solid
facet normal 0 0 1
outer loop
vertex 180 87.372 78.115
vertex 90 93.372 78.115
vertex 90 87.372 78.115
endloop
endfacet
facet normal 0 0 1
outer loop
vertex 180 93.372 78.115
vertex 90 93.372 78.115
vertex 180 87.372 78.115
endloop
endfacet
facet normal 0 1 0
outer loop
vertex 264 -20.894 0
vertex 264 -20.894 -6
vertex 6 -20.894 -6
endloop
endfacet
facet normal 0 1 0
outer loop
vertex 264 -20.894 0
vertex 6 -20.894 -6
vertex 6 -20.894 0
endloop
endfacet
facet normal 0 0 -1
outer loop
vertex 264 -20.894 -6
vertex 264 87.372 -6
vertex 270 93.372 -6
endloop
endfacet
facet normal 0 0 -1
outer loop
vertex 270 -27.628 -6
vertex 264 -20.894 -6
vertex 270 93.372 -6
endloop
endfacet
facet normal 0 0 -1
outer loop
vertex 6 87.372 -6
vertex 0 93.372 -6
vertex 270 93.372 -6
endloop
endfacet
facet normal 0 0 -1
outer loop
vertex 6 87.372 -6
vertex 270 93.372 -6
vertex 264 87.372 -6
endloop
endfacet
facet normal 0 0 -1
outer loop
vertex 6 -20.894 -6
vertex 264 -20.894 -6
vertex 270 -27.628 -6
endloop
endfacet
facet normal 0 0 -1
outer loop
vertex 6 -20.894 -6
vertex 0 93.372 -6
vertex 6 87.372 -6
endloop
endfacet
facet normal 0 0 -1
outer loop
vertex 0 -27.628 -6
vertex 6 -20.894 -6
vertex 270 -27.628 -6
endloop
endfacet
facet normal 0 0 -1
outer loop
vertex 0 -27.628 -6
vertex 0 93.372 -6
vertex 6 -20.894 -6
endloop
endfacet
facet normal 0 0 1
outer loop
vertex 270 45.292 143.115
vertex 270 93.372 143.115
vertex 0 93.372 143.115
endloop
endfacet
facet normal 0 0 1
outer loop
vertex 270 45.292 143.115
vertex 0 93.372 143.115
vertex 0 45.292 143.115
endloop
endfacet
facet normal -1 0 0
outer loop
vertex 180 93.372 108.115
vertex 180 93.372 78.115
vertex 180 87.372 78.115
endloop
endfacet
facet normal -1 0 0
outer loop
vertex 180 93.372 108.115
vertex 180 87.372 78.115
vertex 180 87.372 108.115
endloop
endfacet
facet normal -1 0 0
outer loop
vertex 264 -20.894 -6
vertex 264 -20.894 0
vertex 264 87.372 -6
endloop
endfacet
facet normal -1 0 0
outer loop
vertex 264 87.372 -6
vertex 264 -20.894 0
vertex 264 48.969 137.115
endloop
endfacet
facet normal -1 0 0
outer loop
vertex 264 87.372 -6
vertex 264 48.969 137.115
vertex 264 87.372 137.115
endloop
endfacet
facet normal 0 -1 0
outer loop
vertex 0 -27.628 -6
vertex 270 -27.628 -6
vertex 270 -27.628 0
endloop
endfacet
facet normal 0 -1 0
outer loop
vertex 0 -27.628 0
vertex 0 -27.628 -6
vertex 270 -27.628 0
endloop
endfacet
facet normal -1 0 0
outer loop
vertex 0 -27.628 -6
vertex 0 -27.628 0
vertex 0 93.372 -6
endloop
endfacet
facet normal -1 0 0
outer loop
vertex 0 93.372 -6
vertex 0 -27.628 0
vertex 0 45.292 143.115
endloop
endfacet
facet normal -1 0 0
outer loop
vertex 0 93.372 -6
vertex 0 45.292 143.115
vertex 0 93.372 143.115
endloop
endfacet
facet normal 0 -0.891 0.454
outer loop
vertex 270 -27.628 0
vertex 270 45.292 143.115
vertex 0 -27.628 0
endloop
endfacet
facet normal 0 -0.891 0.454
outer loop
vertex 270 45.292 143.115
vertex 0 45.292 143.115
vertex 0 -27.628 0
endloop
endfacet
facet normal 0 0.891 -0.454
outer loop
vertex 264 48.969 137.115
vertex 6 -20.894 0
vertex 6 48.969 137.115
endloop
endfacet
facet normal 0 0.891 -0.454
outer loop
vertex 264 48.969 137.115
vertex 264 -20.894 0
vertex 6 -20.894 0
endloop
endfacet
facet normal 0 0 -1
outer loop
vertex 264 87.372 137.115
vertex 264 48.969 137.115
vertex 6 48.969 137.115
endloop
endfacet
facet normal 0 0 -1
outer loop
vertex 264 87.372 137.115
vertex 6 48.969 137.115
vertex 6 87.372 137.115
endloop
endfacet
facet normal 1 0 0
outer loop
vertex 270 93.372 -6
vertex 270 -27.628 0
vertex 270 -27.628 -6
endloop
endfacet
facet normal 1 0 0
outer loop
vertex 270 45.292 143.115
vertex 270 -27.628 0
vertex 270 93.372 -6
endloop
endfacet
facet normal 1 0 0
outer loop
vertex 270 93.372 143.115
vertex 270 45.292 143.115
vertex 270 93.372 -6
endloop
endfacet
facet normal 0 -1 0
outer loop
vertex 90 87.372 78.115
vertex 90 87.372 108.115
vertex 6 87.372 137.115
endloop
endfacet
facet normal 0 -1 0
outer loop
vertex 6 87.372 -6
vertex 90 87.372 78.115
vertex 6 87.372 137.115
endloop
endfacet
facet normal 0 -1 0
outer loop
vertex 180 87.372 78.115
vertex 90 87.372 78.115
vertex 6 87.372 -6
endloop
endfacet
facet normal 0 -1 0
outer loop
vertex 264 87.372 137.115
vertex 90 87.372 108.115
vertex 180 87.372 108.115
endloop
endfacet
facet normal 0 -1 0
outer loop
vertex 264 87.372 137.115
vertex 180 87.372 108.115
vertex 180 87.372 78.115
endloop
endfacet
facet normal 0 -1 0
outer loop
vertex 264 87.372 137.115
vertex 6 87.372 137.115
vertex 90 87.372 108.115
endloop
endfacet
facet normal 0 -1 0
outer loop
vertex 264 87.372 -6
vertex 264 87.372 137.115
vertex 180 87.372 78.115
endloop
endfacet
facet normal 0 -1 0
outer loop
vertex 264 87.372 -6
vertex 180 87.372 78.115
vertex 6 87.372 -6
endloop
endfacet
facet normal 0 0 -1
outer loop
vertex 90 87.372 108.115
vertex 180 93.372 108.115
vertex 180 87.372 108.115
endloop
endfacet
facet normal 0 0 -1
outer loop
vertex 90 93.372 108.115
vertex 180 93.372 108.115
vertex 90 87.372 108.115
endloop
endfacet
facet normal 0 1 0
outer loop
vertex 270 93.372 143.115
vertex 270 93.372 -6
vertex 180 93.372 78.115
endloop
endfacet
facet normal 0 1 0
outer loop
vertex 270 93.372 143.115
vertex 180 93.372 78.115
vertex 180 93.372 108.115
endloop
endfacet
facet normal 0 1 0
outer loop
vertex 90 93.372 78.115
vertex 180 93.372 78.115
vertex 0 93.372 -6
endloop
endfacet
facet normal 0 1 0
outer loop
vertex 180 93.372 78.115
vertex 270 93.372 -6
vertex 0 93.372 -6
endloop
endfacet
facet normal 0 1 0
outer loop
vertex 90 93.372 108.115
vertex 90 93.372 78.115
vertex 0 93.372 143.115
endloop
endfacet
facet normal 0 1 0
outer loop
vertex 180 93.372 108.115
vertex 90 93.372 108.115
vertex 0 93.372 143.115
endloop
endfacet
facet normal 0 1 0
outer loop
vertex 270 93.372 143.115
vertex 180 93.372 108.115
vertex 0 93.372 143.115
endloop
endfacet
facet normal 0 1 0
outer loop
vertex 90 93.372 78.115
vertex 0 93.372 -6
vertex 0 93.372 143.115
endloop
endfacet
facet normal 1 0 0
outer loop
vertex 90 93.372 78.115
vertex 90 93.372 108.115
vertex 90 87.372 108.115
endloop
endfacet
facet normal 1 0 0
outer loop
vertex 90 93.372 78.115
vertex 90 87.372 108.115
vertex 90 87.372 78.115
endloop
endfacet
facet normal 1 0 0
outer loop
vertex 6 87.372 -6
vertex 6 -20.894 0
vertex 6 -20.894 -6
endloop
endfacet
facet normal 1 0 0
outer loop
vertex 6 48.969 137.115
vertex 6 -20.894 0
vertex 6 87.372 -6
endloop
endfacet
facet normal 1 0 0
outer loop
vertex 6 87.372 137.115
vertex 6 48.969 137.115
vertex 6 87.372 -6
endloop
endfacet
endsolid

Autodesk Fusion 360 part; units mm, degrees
sketch "Unsorted Smarties Holder" plane through (0, 0, 0) normal (1, 0, 0) x (0, 1, 0)
  line L0 (0, 0) -> (93.3717, 0)
  line L1 (93.3717, 0) -> (93.3717, 143.115)
  line L2 (93.3717, 143.115) -> (45.2924, 143.115)
  line L3 (45.2924, 143.115) -> (-27.6283, 0)
  line L4 (-27.6283, 0) -> (0, 0)
  line L5 (-27.6283, 0) -> (93.3717, 0)
  line L6 (93.3717, 0) -> (93.3717, -6)
  line L7 (93.3717, -6) -> (-27.6283, -6)
  line L8 (-27.6283, -6) -> (-27.6283, 0)
  dimension "d5" = 143.115
  dimension "d14" = 63
  dimension "d23" = 121
  dimension "d31" = 6
extrude "Extrude1" add sketch "Unsorted Smarties Holder" along normal blind 270
sketch "Sketch3" plane through (270, 0, 0) normal (1, 0, 0) x (0, 1, 0)
  line L0 (93.3717, -6) -> (93.3717, 143.115)
  line L1 (93.3717, 143.115) -> (45.2924, 143.115)
  line L2 (45.2924, 143.115) -> (-27.6283, 0)
  line L3 (87.3717, 137.115) -> (87.3717, 0)
  line L4 (87.3717, 0) -> (-20.8944, 0)
  line L5 (-20.8944, 0) -> (48.9692, 137.115)
  line L6 (48.9692, 137.115) -> (87.3717, 137.115)
  line L7 (-27.6283, 0) -> (-27.6283, -6)
  line L8 (-27.6283, -6) -> (93.3717, -6)
  line L9 (-20.8944, 0) -> (87.3717, 0)
  line L10 (87.3717, 0) -> (87.3717, -6)
  line L11 (87.3717, -6) -> (-20.8944, -6)
  line L12 (-20.8944, -6) -> (-20.8944, 0)
  dimension "d15" = 6
  dimension "d16" = 6
  dimension "d17" = 6
  dimension "d18" = 6
  dimension "d32" = 6
  dimension "d33" = 6
extrude "Extrude3" cut sketch "Sketch3" against normal blind 258 from surface at -6 contours L4 L8 L9 L10 L11 L12 | L3 L4 L5 L6 L9
sketch "Smarties Feed" plane through (0, 93.3717, 0) normal (0, 1, 0) x (-1, 0, 0)
  line L0 (0, -6) -> (0, 143.115)
  line L1 (0, 143.115) -> (-270, 143.115)
  line L2 (-270, 143.115) -> (-270, -6)
  line L3 (-180, 108.115) -> (-90, 108.115)
  line L4 (-90, 108.115) -> (-90, 78.115)
  line L5 (-90, 78.115) -> (-180, 78.115)
  line L6 (-180, 78.115) -> (-180, 108.115)
  line L7 (-270, -6) -> (0, -6)
  dimension "d24" = 30
  dimension "d25" = 90
  dimension "d26" = 90
  dimension "d27" = 90
  dimension "d28" = 35
extrude "Extrude4" cut sketch "Smarties Feed" against normal blind 6 contours L3 L4 L5 L6
equation "polycarbonateThickness = 6 mm" comment "Thickness of the polycarbonate panels"
equation "d14 = 180 deg - 117 deg"
equation "d15 = polycarbonateThickness"
equation "d16 = polycarbonateThickness"
equation "d17 = polycarbonateThickness"
equation "d18 = polycarbonateThickness"
equation "d20 = -polycarbonateThickness"
equation "d21 = -( 270 mm - 2 * polycarbonateThickness )"
equation "d28 = 41 mm - 6 mm"
equation "d29 = -polycarbonateThickness"
